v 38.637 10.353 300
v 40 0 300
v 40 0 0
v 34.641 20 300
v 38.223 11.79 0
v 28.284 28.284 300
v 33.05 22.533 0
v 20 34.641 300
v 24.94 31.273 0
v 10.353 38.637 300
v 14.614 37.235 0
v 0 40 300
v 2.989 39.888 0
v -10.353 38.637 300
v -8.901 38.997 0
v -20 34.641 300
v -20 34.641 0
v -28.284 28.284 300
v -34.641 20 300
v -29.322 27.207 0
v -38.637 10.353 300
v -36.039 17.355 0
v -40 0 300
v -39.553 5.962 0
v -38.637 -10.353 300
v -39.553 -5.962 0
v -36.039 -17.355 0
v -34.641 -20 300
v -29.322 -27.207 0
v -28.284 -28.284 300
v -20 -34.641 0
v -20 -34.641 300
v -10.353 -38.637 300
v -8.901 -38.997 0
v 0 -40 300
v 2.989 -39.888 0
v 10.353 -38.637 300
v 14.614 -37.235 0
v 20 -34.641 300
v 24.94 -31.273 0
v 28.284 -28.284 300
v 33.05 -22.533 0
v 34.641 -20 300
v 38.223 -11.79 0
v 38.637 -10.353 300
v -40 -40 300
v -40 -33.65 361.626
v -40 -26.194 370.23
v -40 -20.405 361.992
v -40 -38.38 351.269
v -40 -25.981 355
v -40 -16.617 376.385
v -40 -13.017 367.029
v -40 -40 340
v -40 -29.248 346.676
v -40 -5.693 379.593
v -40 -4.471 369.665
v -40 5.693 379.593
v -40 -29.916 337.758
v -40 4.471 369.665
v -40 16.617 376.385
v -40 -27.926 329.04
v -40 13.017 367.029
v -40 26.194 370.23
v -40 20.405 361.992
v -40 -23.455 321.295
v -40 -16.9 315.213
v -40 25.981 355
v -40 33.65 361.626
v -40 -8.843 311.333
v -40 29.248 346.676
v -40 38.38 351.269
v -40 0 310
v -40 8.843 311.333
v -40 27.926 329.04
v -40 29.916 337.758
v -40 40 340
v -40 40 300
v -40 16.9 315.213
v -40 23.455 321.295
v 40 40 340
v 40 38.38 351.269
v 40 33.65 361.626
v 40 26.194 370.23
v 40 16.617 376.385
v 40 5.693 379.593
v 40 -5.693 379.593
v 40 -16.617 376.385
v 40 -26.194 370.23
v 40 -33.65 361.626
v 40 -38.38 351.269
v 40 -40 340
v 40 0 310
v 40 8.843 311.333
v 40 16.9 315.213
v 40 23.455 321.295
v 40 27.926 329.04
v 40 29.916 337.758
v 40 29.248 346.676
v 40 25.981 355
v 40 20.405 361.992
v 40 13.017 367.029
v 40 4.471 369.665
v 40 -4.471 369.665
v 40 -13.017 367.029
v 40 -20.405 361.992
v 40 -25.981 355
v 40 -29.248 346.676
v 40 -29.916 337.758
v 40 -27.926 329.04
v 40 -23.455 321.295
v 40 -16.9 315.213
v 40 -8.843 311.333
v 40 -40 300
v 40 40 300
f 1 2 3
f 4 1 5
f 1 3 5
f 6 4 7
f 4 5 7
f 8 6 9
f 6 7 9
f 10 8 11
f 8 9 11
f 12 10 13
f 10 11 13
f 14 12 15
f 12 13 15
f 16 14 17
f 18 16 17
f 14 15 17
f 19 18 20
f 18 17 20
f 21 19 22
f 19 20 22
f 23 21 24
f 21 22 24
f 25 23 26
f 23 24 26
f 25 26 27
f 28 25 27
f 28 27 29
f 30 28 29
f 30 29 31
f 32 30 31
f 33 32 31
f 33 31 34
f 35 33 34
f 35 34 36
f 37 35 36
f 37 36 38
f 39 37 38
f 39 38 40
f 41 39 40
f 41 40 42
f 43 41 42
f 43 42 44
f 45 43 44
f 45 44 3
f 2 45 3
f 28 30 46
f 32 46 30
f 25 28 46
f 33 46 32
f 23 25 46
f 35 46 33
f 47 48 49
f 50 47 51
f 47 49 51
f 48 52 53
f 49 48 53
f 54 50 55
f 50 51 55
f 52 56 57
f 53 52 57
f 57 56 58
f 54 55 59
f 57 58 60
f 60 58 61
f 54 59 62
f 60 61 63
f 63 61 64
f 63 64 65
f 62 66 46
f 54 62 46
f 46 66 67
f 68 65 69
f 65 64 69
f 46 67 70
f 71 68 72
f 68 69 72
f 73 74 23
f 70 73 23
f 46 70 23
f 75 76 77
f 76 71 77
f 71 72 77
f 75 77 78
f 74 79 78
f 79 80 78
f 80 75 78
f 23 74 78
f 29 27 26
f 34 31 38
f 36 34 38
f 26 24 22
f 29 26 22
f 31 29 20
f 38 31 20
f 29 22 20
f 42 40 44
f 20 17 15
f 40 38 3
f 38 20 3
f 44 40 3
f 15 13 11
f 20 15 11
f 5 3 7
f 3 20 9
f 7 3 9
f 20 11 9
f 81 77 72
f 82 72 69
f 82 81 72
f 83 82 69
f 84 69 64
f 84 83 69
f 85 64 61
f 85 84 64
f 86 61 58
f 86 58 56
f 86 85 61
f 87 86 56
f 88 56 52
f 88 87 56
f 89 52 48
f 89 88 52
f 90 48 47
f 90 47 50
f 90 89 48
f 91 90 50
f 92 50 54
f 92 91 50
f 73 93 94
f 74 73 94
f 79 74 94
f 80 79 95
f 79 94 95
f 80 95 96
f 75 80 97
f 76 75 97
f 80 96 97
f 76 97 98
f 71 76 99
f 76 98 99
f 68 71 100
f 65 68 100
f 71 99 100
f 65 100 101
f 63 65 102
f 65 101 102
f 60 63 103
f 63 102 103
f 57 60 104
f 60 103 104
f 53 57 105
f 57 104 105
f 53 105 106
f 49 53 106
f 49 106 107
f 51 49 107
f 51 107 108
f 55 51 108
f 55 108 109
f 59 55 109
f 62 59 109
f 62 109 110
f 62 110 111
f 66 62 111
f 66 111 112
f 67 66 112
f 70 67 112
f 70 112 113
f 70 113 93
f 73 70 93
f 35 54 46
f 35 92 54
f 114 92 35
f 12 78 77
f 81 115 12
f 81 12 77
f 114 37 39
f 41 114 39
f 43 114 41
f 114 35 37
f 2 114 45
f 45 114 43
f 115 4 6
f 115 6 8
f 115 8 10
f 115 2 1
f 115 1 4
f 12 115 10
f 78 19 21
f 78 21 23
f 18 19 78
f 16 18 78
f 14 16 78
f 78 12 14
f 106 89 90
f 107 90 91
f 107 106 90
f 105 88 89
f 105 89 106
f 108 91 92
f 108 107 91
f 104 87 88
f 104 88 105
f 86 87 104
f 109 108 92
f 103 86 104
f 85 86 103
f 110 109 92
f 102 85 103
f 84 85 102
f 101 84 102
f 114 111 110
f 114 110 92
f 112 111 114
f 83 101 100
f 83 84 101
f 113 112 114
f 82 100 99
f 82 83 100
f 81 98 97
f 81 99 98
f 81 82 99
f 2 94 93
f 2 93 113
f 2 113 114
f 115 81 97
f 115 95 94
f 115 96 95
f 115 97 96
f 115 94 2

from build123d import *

# Parameters (mm, degrees)
SZKIC1_R                    = 40
DODANIE_WYCI_GNI_CIE1_DEPTH = 300
DODANIE_WYCI_GNI_CIE2_DEPTH = 40
SZKIC3_R                    = 30
WYTNIJ_WYCI_GNI_CIE1_DEPTH  = 81


with BuildPart() as part:
    # Szkic1 → Dodanie-wyciągnięcie1 (new body)
    with BuildSketch(Plane.XY):
        Circle(SZKIC1_R)
    extrude(amount=DODANIE_WYCI_GNI_CIE1_DEPTH)

    # Szkic2 → Dodanie-wyciągnięcie2 (add, symmetric)
    with BuildSketch(Plane(origin=(0, 0, 0), x_dir=(0, 0, -1), z_dir=(1, 0, 0))):
        with BuildLine():
            Line((-340, -40), (-300, -40))
            Line((-300, -40), (-300, 40))
            Line((-300, 40), (-340, 40))
            ThreePointArc((-340, 40), (-380, 0), (-340, -40))
        make_face()
    extrude(amount=DODANIE_WYCI_GNI_CIE2_DEPTH, both=True)

    # Szkic3 → Wytnij-wyciągnięcie1 (cut, through all)
    with BuildSketch(Plane(origin=(40, 0, 0), x_dir=(0, 0, -1), z_dir=(1, 0, 0))):
        with Locations((-340, 0)):
            Circle(SZKIC3_R)
    extrude(amount=-WYTNIJ_WYCI_GNI_CIE1_DEPTH, mode=Mode.SUBTRACT)


solid = part.part
